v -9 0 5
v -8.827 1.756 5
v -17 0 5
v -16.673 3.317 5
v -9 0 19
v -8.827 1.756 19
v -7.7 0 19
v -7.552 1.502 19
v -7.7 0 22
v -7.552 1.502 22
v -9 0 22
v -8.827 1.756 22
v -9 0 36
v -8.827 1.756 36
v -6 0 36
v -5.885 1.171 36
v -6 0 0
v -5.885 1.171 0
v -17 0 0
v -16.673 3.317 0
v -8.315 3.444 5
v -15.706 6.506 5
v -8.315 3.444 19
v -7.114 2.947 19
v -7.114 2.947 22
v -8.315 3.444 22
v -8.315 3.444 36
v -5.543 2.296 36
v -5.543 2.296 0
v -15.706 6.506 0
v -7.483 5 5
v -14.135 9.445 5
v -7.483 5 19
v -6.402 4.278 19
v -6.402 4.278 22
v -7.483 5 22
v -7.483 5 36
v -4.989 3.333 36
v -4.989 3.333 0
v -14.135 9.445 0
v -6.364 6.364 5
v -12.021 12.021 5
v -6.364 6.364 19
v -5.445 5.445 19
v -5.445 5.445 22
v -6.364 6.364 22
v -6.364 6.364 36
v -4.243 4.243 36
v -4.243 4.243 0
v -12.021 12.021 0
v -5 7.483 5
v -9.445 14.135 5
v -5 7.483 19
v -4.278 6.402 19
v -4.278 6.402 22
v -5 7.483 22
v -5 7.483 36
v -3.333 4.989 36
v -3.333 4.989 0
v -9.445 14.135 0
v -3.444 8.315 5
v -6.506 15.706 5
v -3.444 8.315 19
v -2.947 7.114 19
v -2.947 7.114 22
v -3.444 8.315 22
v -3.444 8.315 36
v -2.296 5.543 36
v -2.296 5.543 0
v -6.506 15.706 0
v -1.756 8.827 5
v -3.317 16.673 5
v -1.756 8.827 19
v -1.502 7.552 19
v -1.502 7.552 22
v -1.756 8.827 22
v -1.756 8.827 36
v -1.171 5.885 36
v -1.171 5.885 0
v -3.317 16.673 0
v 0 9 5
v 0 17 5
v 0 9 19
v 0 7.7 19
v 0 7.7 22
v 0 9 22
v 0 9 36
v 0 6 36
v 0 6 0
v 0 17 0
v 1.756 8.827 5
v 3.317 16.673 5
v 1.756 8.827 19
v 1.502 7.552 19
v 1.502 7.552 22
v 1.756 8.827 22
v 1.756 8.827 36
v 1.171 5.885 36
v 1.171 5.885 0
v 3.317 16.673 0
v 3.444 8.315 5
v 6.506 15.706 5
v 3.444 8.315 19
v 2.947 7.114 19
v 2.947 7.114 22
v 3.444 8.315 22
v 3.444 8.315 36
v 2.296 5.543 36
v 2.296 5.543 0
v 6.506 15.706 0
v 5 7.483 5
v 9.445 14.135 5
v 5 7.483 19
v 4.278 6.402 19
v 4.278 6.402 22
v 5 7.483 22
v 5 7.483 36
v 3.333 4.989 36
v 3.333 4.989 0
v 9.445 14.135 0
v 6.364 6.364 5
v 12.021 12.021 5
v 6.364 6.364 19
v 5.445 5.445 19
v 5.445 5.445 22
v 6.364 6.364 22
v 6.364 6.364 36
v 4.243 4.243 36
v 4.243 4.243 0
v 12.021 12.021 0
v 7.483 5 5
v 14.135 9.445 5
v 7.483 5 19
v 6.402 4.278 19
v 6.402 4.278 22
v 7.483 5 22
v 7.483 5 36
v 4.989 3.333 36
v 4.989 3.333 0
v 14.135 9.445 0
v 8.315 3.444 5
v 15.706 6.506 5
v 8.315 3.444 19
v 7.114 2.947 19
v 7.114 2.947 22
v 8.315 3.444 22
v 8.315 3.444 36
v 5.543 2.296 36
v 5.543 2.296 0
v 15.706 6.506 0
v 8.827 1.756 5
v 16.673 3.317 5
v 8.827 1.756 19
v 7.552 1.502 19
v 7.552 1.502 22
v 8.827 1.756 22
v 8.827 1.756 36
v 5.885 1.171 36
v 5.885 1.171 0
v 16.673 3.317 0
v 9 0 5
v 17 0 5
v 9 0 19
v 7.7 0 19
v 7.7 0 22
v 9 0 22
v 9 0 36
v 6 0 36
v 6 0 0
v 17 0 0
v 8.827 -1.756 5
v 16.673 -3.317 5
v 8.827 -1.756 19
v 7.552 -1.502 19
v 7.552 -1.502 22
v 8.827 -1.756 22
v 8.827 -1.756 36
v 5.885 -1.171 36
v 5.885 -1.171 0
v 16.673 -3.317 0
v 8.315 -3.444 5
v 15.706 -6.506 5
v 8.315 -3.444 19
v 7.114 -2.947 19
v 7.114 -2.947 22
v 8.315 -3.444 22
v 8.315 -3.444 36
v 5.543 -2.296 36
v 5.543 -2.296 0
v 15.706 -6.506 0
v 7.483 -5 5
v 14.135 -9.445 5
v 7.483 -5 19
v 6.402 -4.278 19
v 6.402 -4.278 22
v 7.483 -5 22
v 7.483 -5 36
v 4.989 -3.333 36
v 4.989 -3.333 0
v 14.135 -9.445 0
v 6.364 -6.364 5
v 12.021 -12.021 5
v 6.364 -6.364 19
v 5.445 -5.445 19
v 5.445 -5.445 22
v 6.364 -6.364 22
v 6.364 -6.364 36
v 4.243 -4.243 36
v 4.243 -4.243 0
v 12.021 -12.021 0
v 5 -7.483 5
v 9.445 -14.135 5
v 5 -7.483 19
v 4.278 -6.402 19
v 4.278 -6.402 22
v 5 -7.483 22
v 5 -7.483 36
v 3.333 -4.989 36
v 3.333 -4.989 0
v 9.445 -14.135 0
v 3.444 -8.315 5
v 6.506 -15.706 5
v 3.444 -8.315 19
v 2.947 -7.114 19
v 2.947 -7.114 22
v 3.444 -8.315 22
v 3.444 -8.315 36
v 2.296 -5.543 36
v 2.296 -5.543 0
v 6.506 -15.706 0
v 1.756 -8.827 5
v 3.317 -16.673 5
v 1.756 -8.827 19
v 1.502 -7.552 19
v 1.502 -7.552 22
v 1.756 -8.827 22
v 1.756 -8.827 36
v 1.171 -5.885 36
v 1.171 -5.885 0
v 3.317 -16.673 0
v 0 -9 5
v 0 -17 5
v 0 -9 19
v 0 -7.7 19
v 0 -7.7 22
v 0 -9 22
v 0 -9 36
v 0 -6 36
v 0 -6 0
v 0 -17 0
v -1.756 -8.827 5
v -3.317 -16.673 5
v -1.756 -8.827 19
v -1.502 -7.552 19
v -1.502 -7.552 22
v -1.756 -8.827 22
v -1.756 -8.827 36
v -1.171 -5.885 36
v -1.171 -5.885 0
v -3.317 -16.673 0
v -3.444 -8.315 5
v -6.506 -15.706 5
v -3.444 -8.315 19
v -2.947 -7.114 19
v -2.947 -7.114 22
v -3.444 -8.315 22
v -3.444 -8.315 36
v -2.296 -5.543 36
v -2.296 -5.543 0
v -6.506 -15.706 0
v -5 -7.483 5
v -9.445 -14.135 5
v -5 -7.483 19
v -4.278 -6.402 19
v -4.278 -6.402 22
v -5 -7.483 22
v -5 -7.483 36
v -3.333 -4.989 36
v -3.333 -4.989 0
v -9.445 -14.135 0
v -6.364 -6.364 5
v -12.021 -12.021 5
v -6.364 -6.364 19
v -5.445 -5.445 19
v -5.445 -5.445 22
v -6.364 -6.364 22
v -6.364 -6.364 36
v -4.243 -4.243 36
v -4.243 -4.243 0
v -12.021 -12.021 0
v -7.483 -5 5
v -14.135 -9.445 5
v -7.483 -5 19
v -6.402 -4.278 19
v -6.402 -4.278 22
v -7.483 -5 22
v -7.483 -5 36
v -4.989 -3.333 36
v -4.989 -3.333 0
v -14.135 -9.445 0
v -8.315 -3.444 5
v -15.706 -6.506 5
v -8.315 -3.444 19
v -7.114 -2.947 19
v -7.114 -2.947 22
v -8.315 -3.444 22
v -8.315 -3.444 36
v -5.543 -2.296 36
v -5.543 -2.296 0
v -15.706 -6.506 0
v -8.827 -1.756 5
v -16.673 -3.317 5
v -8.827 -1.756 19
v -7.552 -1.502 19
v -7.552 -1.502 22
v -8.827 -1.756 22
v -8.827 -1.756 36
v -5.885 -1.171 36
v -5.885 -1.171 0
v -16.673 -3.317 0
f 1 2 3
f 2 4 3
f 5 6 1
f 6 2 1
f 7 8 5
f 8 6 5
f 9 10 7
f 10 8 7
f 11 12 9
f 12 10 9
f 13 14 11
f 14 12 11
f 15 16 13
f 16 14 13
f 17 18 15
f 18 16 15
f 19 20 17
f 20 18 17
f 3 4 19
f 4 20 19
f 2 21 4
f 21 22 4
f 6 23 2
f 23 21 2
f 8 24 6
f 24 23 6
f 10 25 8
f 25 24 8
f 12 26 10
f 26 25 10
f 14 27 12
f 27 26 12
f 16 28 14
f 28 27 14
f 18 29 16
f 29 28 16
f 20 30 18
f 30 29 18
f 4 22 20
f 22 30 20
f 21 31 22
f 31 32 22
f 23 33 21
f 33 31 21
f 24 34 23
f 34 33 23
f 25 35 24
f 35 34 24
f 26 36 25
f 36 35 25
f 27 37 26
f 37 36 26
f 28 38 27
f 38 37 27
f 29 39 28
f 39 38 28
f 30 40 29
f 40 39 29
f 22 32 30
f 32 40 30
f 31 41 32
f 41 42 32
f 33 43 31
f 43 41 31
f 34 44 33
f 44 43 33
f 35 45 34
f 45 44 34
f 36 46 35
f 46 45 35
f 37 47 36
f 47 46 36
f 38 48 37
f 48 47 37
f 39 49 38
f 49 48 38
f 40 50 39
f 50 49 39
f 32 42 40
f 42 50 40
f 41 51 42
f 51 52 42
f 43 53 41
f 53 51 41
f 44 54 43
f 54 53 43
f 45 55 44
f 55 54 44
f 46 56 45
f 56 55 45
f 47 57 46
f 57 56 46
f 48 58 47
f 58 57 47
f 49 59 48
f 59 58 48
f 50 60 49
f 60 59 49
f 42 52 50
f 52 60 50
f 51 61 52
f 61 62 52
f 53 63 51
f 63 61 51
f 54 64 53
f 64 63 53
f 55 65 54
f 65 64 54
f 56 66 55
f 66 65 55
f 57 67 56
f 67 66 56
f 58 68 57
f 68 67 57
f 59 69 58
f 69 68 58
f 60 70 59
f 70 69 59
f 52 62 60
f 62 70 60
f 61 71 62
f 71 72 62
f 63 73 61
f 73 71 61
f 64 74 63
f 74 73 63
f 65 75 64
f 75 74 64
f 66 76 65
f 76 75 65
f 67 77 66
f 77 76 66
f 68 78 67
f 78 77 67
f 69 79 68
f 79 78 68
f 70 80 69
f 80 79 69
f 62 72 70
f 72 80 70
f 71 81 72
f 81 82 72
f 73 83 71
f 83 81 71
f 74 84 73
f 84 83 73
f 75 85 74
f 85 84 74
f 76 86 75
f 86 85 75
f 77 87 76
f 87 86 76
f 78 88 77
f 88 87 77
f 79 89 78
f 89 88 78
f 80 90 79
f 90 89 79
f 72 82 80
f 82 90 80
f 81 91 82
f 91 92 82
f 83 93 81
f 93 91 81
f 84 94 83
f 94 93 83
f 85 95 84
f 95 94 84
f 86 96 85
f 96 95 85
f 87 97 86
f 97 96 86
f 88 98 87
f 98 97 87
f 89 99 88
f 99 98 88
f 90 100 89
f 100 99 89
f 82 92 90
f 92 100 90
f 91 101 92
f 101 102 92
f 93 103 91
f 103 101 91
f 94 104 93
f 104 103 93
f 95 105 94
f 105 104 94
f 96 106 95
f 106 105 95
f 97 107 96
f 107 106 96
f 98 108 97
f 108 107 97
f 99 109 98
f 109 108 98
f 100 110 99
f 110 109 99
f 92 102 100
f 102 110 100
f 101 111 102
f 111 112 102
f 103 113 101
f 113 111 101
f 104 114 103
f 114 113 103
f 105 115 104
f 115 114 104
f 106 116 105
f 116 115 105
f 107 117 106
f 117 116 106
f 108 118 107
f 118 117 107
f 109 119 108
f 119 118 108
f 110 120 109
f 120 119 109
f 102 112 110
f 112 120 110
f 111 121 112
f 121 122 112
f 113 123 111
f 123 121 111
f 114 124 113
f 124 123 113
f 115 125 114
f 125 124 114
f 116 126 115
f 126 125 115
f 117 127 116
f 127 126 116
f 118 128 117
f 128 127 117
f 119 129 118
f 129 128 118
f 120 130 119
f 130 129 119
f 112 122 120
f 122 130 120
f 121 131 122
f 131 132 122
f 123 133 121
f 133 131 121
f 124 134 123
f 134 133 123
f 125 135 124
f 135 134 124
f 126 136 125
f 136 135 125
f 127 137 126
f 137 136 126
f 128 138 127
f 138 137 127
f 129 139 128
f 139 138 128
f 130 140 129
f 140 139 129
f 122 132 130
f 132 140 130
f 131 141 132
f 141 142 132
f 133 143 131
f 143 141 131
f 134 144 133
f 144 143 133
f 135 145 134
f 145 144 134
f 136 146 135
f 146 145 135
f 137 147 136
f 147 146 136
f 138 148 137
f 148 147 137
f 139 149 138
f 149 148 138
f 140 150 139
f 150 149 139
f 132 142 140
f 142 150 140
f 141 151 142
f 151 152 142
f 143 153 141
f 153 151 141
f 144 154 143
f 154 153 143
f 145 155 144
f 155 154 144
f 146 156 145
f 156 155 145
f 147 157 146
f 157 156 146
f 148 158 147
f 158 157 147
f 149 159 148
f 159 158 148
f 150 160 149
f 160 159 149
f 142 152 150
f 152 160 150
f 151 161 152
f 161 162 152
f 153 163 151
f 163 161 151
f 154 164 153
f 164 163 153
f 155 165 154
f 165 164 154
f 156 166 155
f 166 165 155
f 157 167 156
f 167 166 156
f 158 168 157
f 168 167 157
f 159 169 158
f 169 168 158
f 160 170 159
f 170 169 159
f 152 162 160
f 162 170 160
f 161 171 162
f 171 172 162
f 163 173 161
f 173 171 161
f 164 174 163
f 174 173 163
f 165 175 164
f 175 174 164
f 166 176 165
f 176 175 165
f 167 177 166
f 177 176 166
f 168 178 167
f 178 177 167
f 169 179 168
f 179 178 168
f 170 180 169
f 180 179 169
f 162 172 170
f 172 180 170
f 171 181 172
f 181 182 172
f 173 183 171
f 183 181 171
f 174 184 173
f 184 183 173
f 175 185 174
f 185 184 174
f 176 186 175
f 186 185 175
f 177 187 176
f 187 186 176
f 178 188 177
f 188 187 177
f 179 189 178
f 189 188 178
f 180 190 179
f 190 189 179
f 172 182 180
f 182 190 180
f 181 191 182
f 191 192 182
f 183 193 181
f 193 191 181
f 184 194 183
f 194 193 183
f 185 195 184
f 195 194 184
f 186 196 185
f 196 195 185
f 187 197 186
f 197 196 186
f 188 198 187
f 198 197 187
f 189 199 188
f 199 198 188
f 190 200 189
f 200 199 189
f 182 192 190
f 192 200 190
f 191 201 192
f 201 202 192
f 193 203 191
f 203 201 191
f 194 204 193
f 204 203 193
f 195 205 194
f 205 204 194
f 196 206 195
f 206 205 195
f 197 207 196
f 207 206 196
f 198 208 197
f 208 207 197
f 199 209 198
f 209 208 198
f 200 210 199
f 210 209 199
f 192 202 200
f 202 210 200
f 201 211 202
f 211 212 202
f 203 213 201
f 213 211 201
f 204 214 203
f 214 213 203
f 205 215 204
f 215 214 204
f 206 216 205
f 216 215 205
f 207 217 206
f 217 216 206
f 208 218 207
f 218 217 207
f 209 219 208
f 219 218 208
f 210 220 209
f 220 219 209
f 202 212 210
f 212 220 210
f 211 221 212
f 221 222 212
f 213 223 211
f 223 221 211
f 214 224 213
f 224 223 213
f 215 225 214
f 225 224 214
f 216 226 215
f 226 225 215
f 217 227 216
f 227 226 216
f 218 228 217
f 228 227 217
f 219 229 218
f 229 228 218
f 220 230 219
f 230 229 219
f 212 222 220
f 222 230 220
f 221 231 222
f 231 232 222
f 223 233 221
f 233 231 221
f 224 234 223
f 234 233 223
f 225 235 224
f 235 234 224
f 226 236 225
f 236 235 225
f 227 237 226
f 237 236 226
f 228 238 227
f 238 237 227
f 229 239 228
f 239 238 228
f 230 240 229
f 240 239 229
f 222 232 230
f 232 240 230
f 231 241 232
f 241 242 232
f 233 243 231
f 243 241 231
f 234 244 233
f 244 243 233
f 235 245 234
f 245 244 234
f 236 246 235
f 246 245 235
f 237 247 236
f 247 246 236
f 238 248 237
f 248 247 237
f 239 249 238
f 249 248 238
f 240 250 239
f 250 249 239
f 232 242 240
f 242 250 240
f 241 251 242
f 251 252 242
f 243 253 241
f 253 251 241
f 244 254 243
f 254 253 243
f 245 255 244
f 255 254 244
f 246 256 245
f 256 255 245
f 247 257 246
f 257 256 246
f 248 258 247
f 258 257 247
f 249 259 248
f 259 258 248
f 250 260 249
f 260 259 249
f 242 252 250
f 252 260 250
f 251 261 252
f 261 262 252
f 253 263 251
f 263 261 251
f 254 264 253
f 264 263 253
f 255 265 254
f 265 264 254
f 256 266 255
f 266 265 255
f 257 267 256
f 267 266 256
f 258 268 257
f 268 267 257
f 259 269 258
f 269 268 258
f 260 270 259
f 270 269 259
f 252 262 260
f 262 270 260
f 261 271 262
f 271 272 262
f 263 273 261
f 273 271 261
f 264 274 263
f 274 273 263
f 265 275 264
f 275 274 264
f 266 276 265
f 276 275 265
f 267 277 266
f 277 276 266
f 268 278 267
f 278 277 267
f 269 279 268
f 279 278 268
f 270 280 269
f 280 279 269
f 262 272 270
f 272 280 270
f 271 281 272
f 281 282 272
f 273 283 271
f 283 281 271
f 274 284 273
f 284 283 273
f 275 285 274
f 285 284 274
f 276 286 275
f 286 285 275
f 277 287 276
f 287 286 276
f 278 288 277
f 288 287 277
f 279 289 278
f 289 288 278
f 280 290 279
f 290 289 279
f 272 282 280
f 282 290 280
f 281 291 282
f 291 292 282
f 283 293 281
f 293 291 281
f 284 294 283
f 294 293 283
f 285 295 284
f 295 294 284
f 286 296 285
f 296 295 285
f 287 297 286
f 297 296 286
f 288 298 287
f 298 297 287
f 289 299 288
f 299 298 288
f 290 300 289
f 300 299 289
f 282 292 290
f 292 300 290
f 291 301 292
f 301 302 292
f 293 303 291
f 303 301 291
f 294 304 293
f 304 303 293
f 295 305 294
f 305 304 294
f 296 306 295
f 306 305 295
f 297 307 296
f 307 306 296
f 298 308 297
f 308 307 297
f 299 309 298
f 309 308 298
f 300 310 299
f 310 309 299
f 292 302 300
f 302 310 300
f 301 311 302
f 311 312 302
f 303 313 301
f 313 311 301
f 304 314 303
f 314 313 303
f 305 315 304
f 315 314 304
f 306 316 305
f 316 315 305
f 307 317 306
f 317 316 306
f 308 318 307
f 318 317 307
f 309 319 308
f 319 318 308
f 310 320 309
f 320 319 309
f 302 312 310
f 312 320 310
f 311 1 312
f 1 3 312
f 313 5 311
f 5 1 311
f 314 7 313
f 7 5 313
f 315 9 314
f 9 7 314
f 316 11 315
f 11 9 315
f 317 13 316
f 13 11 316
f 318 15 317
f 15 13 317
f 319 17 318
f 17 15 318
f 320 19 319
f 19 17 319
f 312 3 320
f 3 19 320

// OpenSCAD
$fn = 32;

// ----------------------------------------------------------------------
// Grooved revolve: flanged, bore R6
// ----------------------------------------------------------------------

// --- parameters (mm) ---
bore_r = 6;               // bore radius
outer_r = 9;              // outer radius of the body
total_h = 36;             // overall height, Z
wall = 3;                 // radial wall thickness
groove_w = 3;             // groove width
groove_d = 1.3;           // groove depth
grooves = 1;              // number of outer grooves
flange_r = 17;            // flange radius
flange_h = 5;             // flange height

bbox_x = 2 * flange_r;  // full diameter
bore_d = 2 * bore_r;  // bore diameter
body_d = 2 * outer_r;  // body diameter
flange_d = 2 * flange_r;  // flange diameter
revolve_angle = 360;  // full turn around the Z axis

profile = [[6, 0], [9, 0], [17, 0], [17, 5], [9, 5], [9, 19], [7.7, 19], [7.7, 22], [9, 22], [9, 36], [6, 36]];  // primary outline, 11 points, counter clockwise

// --- the one profile operation ---
rotate_extrude(angle = revolve_angle) polygon(points = profile);
